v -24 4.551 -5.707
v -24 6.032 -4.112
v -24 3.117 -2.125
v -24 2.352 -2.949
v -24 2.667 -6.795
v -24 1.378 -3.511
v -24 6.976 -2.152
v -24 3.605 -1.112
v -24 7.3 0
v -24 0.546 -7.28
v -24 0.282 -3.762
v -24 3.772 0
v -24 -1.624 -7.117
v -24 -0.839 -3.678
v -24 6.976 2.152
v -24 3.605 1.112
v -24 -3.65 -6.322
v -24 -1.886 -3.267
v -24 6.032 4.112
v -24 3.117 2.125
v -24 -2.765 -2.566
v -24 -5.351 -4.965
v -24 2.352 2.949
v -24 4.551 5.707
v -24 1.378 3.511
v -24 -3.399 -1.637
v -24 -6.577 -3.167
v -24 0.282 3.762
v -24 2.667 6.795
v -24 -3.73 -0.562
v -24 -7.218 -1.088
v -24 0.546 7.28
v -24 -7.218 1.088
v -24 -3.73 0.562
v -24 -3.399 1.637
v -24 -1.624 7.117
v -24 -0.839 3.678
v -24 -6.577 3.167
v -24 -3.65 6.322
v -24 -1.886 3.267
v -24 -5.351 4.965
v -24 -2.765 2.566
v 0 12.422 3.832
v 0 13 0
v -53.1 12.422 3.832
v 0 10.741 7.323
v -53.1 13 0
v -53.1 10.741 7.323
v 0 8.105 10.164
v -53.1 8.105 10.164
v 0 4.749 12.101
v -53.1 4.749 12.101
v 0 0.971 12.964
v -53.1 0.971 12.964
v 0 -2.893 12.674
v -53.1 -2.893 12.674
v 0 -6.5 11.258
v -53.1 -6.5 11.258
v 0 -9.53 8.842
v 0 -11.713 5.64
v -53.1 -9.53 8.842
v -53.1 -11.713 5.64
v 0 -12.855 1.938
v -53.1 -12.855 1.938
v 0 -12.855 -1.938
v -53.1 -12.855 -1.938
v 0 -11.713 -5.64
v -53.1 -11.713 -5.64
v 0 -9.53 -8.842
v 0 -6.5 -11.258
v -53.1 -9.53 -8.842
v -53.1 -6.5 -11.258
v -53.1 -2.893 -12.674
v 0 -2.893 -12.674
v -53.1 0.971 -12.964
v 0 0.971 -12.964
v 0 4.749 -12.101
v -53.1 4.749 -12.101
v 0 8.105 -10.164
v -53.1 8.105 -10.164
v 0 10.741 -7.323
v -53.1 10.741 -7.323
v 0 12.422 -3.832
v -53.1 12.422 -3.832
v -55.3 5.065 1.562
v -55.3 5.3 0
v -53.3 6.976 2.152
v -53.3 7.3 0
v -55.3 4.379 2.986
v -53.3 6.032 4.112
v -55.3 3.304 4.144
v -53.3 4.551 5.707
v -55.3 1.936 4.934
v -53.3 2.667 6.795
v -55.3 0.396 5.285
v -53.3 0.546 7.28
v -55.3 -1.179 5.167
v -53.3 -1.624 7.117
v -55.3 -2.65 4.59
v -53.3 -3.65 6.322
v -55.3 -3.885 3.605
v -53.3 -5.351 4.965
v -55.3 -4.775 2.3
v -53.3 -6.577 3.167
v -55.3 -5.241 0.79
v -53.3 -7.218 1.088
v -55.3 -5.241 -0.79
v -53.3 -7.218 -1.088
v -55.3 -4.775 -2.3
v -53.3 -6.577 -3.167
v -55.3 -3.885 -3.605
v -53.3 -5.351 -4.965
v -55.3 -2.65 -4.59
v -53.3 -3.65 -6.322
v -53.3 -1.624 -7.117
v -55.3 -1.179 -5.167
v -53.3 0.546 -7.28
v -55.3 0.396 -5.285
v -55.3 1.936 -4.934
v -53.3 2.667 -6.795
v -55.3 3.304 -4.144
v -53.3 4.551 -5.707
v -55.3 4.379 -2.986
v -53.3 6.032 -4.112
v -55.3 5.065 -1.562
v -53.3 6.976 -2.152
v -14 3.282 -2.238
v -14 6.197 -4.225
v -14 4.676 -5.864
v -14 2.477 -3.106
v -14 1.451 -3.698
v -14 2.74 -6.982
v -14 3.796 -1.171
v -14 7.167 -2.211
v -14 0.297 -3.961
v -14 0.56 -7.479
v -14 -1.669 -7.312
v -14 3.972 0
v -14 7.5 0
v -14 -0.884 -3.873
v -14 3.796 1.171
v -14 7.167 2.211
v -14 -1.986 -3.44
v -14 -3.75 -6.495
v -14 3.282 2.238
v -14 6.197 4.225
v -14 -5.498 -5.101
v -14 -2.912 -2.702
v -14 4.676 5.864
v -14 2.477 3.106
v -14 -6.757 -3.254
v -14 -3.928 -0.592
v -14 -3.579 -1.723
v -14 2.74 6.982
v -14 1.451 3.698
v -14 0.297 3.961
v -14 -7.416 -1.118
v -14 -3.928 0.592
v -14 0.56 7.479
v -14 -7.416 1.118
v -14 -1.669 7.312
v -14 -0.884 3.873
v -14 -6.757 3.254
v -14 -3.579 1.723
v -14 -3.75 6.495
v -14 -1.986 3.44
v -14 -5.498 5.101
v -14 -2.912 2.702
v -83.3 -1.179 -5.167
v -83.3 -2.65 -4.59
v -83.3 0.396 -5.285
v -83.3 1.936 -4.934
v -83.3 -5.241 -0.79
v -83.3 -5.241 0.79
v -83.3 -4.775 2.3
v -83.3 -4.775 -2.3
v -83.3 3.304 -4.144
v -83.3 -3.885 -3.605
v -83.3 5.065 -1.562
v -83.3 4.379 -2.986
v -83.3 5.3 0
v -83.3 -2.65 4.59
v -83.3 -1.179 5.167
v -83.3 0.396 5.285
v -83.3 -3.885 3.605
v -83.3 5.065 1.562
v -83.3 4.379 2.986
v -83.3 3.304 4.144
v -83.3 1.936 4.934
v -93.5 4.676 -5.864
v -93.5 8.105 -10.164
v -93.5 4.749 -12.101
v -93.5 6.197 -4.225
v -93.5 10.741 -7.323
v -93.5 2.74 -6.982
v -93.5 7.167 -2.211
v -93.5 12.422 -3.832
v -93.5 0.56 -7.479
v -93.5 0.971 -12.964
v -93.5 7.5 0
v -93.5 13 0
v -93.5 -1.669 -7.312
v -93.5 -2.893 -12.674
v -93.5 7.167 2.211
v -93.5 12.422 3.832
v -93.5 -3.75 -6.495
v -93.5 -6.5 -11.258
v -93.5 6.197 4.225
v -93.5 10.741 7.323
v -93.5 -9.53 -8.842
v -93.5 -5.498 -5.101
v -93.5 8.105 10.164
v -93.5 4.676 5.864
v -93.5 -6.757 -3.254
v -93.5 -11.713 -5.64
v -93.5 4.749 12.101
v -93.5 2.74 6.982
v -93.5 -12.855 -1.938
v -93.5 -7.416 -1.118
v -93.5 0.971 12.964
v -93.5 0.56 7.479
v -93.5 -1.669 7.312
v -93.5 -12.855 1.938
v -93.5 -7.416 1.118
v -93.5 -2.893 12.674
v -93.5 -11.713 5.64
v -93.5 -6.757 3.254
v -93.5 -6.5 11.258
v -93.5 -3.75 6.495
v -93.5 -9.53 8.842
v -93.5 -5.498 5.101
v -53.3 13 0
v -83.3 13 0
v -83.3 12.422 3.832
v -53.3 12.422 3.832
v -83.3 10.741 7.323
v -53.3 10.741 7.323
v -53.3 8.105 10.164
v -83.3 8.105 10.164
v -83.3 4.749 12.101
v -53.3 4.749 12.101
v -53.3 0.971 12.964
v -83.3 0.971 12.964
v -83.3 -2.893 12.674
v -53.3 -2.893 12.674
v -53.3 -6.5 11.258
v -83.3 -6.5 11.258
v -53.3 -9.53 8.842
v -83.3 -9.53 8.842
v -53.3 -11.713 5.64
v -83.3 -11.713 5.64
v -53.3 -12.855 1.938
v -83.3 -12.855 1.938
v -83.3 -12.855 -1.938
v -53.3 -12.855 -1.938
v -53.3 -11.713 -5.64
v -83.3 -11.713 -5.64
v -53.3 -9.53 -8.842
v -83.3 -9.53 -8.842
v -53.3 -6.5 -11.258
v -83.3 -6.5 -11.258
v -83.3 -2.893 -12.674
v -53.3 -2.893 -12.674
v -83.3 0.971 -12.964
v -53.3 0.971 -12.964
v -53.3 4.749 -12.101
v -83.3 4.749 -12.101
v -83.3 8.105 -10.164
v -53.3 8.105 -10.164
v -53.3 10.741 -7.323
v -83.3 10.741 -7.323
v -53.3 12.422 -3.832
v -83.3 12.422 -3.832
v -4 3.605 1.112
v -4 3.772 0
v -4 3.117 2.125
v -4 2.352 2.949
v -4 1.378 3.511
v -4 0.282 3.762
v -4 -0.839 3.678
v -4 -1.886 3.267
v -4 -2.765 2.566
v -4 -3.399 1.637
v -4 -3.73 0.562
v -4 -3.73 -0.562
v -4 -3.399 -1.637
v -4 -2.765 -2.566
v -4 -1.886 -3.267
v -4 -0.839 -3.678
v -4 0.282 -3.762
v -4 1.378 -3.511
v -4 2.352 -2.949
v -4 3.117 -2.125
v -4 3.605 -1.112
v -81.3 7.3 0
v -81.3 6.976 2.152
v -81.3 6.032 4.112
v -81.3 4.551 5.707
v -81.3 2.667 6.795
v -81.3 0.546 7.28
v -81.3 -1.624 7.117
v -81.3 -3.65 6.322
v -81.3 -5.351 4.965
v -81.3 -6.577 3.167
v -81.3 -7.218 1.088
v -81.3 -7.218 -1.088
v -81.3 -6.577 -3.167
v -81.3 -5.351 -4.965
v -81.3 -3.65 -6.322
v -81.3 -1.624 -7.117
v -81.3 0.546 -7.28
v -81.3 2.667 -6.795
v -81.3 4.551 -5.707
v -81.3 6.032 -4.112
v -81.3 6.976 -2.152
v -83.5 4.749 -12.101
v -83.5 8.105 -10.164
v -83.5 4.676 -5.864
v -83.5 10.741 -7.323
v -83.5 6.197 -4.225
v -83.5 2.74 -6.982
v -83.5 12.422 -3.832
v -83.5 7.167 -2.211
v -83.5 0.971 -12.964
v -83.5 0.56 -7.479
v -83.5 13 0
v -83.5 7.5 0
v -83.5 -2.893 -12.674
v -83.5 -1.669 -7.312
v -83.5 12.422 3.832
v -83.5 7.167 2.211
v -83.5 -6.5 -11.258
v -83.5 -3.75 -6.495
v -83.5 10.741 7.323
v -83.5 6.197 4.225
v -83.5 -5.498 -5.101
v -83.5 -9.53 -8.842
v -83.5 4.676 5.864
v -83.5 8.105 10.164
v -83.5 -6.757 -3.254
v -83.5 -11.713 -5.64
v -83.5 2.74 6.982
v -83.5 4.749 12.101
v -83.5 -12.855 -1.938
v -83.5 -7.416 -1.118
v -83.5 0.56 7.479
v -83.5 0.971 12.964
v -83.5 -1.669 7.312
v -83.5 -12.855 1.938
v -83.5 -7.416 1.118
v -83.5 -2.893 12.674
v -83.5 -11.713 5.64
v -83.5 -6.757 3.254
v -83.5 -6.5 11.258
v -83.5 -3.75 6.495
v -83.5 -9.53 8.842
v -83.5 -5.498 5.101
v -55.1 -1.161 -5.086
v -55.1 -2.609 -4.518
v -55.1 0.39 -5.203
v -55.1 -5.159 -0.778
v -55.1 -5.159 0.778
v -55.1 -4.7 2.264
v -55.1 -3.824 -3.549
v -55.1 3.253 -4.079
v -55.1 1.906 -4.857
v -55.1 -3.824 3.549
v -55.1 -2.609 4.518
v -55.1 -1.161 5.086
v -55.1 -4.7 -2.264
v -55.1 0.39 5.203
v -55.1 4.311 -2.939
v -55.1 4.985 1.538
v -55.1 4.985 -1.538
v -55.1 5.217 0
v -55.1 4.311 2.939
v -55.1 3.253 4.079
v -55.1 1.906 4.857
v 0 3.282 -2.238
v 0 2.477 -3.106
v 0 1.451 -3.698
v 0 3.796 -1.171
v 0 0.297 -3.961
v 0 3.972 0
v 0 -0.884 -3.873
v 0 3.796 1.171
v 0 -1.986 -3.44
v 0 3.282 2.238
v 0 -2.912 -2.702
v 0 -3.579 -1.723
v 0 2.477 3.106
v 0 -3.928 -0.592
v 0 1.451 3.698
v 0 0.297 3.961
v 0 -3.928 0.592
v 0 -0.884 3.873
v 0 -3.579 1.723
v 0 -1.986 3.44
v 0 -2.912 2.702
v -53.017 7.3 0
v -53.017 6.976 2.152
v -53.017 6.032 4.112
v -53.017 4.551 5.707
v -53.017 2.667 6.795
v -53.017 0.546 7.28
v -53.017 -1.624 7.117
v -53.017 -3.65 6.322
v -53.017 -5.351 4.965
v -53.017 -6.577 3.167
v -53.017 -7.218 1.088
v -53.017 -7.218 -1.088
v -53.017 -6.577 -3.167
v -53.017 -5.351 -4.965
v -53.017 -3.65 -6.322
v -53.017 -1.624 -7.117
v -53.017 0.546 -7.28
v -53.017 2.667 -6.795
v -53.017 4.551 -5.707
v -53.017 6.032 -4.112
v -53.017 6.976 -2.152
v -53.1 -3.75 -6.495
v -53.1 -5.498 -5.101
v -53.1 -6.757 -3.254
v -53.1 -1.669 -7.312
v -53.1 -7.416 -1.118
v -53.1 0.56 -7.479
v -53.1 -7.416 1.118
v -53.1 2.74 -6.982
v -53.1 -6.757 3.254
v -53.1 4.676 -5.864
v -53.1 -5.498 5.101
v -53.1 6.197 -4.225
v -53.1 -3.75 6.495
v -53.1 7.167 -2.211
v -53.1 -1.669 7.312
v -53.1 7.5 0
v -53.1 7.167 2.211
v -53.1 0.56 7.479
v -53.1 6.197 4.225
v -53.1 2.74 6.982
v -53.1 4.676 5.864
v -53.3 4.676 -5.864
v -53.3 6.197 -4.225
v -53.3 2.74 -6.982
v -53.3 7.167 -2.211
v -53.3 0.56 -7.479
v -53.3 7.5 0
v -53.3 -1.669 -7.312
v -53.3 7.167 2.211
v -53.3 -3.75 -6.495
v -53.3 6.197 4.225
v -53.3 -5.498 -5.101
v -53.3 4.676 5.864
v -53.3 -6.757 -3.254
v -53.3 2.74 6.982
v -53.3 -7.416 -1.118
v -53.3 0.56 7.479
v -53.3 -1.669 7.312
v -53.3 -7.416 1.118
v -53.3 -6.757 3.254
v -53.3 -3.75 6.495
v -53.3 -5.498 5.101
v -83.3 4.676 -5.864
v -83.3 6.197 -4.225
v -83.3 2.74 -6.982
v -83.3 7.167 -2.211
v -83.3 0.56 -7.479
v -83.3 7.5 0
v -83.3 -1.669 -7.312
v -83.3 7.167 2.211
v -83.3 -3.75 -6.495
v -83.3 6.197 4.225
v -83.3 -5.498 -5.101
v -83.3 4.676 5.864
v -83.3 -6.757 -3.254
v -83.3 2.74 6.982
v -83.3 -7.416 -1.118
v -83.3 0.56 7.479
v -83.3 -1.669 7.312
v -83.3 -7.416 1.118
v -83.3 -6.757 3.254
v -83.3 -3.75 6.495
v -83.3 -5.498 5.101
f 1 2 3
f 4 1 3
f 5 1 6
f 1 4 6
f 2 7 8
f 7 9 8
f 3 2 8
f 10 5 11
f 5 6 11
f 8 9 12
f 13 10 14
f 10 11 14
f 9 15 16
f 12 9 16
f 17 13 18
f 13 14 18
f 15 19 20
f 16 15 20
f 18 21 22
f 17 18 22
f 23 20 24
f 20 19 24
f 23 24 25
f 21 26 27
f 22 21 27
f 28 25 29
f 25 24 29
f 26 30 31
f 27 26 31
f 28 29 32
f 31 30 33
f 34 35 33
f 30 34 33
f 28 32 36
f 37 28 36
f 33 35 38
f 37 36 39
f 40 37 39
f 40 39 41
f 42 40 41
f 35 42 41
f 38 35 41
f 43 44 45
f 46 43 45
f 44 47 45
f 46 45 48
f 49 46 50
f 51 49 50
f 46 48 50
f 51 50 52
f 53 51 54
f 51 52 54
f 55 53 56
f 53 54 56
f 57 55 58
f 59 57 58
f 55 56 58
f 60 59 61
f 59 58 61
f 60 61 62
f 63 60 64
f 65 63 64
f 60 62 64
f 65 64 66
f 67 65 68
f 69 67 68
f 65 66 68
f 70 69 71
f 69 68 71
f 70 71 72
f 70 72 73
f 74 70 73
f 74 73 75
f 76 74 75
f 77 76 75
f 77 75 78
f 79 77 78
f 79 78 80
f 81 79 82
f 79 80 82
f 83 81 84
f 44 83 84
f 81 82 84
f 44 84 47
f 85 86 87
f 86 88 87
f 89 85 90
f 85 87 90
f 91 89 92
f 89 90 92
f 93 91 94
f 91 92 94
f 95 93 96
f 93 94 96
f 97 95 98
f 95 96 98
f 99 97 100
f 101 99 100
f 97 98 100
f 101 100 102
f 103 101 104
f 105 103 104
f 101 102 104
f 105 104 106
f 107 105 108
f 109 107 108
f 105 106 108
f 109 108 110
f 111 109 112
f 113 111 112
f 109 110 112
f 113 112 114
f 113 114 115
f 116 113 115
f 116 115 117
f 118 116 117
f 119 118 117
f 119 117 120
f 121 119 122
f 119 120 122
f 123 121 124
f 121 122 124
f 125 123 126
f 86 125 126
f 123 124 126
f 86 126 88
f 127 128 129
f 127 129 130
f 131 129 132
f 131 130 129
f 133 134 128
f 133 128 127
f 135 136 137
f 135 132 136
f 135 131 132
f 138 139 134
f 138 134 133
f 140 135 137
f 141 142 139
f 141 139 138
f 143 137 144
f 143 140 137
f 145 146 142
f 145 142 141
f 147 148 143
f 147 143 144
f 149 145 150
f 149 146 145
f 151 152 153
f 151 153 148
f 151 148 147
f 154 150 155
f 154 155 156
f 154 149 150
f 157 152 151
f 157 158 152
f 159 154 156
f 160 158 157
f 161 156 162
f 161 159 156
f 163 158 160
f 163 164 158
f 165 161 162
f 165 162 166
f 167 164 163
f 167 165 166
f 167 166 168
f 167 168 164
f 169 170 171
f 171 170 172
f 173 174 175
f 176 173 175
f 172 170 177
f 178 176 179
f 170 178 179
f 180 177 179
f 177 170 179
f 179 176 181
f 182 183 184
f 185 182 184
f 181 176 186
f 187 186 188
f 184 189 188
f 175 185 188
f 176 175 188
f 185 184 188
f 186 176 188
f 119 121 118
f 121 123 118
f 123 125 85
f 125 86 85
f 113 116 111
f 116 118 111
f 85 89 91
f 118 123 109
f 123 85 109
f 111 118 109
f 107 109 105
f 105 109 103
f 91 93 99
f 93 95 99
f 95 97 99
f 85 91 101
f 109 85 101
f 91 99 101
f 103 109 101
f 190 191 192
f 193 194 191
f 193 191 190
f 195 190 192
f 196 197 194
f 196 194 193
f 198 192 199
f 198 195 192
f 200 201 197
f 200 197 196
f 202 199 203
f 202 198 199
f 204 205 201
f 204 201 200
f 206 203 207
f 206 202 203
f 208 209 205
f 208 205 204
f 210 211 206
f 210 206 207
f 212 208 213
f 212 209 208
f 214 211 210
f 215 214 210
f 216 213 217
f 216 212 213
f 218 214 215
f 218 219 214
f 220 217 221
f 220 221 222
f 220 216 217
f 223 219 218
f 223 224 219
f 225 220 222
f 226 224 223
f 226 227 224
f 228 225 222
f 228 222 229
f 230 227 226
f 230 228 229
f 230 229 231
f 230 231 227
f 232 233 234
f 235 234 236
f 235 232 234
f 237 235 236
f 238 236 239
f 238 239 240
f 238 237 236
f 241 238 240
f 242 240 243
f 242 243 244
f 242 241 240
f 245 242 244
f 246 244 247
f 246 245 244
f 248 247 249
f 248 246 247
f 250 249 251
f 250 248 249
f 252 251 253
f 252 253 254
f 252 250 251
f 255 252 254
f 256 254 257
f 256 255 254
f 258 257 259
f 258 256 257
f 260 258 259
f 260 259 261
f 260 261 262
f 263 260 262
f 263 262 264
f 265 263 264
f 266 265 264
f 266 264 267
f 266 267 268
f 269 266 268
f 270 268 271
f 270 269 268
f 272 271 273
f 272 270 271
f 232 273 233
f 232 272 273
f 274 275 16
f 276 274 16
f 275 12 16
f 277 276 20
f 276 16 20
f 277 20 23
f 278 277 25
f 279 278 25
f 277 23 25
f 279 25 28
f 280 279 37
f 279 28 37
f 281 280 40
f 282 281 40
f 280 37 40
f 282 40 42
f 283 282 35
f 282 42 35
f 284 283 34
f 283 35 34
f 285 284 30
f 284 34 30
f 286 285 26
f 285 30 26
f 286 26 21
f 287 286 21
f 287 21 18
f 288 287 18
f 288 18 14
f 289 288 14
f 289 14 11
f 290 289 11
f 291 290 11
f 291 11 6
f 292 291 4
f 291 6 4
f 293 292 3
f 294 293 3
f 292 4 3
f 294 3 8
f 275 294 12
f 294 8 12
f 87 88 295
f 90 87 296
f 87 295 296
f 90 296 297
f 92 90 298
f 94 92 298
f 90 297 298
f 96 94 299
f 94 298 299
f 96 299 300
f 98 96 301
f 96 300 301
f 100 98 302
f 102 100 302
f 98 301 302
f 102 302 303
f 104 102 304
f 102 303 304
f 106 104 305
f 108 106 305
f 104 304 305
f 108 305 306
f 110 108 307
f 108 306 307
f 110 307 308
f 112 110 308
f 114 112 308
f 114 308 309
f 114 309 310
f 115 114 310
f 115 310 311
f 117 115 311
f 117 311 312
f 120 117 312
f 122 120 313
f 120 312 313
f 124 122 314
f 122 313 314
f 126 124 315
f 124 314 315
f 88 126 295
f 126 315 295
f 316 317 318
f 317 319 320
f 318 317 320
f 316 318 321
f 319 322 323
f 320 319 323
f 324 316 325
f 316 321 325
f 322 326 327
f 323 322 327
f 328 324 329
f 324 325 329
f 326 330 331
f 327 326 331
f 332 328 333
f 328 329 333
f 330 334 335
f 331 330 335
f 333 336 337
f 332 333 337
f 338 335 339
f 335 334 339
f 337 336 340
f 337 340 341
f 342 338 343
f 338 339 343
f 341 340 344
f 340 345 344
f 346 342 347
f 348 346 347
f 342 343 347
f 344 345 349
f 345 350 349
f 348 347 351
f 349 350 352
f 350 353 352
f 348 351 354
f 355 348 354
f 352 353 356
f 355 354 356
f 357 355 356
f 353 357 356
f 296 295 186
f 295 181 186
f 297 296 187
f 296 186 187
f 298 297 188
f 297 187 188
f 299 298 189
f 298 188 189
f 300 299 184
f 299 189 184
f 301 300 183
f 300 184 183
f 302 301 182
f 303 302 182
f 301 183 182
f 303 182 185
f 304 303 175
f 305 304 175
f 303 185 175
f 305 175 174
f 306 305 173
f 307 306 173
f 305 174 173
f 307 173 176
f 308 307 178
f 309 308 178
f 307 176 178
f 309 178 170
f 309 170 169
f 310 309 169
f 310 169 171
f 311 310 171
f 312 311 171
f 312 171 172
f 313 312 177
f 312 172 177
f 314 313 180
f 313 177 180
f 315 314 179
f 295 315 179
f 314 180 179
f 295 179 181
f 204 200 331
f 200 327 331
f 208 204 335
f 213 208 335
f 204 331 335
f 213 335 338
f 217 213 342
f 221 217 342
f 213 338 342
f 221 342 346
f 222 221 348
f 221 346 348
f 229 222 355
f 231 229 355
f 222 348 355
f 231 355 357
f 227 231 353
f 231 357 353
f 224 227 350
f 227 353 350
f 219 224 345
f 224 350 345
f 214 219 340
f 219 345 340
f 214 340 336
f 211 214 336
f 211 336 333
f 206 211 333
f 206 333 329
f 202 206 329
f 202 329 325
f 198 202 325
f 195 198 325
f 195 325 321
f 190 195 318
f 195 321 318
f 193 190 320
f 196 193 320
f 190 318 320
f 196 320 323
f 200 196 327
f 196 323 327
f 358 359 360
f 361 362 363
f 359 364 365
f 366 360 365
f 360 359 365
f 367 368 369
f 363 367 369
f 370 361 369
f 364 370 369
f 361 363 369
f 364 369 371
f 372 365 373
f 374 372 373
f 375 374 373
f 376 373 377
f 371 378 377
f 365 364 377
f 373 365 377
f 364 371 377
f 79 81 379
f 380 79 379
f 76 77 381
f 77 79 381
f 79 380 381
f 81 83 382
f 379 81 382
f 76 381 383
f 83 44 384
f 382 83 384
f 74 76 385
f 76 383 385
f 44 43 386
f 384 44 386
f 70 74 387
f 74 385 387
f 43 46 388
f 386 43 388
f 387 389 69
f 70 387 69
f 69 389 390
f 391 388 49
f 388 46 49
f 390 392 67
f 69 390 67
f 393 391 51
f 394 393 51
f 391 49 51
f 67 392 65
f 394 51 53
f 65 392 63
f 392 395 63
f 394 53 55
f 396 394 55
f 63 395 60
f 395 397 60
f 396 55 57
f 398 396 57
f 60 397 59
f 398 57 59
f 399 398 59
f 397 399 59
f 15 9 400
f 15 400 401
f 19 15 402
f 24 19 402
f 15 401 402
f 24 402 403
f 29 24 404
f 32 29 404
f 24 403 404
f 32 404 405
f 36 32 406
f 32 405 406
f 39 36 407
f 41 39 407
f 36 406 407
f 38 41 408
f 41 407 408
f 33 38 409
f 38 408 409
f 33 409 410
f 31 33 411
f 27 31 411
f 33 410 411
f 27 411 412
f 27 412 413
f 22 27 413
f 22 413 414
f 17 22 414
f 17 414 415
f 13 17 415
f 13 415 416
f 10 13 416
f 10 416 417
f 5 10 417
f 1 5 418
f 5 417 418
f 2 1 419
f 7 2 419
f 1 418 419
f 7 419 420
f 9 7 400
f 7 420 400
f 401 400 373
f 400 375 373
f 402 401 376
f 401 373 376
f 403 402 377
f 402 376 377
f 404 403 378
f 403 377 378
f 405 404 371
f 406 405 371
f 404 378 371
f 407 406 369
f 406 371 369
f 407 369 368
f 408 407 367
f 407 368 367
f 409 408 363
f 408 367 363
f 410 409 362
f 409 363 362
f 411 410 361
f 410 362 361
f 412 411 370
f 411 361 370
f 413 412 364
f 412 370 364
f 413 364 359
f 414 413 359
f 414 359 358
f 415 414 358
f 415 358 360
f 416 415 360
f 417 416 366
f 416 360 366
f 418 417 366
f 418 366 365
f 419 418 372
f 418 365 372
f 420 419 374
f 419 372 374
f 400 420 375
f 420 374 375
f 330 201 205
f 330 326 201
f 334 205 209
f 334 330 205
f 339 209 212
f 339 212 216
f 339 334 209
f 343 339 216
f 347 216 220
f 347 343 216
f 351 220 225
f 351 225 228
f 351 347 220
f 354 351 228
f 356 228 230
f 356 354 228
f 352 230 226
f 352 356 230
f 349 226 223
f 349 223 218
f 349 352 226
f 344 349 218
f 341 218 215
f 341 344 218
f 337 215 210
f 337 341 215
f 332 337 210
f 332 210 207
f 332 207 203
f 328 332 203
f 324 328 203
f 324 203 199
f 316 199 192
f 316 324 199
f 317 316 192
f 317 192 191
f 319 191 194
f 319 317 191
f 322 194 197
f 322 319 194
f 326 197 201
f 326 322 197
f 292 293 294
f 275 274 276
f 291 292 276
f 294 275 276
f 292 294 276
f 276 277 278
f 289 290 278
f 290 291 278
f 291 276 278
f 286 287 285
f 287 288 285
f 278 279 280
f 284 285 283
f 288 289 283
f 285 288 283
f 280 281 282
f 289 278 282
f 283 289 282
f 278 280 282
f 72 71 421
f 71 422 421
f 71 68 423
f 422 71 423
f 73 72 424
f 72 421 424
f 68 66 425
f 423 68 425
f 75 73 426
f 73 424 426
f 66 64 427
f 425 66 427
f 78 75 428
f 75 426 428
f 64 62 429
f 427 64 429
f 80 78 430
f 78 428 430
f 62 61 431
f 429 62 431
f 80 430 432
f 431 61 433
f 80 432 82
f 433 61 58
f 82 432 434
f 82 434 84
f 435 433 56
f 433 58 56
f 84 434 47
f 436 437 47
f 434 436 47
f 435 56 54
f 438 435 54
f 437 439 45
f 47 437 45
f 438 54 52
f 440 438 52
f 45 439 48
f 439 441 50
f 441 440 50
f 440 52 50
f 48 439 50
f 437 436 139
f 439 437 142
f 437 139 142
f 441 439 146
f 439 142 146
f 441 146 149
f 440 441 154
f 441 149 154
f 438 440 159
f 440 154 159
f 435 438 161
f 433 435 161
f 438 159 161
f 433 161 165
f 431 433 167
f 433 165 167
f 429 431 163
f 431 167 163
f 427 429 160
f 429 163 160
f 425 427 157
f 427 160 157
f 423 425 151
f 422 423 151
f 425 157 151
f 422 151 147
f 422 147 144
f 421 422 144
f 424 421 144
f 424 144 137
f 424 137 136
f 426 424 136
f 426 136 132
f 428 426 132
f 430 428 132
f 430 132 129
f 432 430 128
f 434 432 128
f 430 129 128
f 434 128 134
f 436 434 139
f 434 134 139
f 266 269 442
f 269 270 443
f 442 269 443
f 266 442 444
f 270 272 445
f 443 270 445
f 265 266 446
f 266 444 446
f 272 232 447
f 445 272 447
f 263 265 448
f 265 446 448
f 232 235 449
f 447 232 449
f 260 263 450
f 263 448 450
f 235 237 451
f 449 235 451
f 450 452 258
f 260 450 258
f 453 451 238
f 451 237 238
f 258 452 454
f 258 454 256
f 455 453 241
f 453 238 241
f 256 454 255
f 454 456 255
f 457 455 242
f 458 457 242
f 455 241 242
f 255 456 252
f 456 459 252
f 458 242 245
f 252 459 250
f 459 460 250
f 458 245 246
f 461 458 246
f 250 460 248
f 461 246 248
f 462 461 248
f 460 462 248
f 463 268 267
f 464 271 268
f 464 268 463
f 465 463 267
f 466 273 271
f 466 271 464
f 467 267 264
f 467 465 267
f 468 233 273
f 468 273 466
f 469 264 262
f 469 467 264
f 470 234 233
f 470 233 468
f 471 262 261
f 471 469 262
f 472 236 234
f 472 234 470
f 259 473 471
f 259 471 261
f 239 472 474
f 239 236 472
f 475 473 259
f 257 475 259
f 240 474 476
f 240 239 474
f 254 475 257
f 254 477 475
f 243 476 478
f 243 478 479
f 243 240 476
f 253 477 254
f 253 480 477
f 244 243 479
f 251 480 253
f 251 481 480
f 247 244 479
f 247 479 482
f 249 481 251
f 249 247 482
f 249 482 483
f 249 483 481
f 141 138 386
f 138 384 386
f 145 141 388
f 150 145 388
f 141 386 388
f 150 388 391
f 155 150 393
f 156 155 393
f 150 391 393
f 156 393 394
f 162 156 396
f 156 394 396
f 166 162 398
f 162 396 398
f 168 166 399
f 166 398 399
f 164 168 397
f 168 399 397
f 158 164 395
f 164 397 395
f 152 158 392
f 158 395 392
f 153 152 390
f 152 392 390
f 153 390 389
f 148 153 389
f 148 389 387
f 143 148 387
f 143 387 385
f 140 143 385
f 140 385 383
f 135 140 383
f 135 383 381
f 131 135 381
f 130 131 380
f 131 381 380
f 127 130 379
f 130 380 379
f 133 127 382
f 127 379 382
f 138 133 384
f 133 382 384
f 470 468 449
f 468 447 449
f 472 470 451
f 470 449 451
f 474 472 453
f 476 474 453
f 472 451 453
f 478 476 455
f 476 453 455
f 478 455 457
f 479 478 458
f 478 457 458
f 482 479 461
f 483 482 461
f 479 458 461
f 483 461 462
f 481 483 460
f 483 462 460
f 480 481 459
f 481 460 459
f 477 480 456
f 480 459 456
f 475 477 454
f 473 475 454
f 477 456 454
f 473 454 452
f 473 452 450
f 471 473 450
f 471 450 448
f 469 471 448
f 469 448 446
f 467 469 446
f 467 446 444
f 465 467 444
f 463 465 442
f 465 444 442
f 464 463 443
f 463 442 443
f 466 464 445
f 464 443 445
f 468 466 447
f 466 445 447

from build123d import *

# Parameters (mm, degrees)
F0_W   = 10
F0_H   = 5.5
F0_W_2 = 30
F0_W_3 = 14
F0_H_2 = 3.527812


with BuildPart() as f1:
    # F0 (on Top) → F1 (revolve)
    with BuildSketch(Plane.XY):
        with Locations((-88.5, 10.25)):
            Rectangle(F0_W, F0_H)
        with Locations((-68.3, 10.25)):
            Rectangle(F0_W_2, F0_H)
        Polygon((0, 13), (-53.1, 13), (-53.1, 7.5), (-14, 7.5), (0, 7.5), align=None)
        Polygon((-55.3, 5.3), (-53.3, 7.3), (-81.3, 7.3), (-83.3, 5.3), (-83.3, 0), (-55.3, 0), align=None)
        Polygon((-53.3, 0), (-53.3, 7.017157), (-55.1, 5.217157), (-55.1, 0), align=None)
        Polygon((-53.1, 0), (-53.1, 7.217157), (-53.3, 7.017157), (-53.3, 0), align=None)
        Polygon((-53.017157, 7.3), (-53.1, 7.217157), (-53.1, 0), (-4, 0), (-4, 3.772188), (-24, 3.772188), (-24, 7.3), align=None)
        with Locations((-7, 5.736094)):
            Rectangle(F0_W_3, F0_H_2)
    revolve(axis=Axis((-26.55, 0, 0), (1, 0, 0)))


solid = f1.part
